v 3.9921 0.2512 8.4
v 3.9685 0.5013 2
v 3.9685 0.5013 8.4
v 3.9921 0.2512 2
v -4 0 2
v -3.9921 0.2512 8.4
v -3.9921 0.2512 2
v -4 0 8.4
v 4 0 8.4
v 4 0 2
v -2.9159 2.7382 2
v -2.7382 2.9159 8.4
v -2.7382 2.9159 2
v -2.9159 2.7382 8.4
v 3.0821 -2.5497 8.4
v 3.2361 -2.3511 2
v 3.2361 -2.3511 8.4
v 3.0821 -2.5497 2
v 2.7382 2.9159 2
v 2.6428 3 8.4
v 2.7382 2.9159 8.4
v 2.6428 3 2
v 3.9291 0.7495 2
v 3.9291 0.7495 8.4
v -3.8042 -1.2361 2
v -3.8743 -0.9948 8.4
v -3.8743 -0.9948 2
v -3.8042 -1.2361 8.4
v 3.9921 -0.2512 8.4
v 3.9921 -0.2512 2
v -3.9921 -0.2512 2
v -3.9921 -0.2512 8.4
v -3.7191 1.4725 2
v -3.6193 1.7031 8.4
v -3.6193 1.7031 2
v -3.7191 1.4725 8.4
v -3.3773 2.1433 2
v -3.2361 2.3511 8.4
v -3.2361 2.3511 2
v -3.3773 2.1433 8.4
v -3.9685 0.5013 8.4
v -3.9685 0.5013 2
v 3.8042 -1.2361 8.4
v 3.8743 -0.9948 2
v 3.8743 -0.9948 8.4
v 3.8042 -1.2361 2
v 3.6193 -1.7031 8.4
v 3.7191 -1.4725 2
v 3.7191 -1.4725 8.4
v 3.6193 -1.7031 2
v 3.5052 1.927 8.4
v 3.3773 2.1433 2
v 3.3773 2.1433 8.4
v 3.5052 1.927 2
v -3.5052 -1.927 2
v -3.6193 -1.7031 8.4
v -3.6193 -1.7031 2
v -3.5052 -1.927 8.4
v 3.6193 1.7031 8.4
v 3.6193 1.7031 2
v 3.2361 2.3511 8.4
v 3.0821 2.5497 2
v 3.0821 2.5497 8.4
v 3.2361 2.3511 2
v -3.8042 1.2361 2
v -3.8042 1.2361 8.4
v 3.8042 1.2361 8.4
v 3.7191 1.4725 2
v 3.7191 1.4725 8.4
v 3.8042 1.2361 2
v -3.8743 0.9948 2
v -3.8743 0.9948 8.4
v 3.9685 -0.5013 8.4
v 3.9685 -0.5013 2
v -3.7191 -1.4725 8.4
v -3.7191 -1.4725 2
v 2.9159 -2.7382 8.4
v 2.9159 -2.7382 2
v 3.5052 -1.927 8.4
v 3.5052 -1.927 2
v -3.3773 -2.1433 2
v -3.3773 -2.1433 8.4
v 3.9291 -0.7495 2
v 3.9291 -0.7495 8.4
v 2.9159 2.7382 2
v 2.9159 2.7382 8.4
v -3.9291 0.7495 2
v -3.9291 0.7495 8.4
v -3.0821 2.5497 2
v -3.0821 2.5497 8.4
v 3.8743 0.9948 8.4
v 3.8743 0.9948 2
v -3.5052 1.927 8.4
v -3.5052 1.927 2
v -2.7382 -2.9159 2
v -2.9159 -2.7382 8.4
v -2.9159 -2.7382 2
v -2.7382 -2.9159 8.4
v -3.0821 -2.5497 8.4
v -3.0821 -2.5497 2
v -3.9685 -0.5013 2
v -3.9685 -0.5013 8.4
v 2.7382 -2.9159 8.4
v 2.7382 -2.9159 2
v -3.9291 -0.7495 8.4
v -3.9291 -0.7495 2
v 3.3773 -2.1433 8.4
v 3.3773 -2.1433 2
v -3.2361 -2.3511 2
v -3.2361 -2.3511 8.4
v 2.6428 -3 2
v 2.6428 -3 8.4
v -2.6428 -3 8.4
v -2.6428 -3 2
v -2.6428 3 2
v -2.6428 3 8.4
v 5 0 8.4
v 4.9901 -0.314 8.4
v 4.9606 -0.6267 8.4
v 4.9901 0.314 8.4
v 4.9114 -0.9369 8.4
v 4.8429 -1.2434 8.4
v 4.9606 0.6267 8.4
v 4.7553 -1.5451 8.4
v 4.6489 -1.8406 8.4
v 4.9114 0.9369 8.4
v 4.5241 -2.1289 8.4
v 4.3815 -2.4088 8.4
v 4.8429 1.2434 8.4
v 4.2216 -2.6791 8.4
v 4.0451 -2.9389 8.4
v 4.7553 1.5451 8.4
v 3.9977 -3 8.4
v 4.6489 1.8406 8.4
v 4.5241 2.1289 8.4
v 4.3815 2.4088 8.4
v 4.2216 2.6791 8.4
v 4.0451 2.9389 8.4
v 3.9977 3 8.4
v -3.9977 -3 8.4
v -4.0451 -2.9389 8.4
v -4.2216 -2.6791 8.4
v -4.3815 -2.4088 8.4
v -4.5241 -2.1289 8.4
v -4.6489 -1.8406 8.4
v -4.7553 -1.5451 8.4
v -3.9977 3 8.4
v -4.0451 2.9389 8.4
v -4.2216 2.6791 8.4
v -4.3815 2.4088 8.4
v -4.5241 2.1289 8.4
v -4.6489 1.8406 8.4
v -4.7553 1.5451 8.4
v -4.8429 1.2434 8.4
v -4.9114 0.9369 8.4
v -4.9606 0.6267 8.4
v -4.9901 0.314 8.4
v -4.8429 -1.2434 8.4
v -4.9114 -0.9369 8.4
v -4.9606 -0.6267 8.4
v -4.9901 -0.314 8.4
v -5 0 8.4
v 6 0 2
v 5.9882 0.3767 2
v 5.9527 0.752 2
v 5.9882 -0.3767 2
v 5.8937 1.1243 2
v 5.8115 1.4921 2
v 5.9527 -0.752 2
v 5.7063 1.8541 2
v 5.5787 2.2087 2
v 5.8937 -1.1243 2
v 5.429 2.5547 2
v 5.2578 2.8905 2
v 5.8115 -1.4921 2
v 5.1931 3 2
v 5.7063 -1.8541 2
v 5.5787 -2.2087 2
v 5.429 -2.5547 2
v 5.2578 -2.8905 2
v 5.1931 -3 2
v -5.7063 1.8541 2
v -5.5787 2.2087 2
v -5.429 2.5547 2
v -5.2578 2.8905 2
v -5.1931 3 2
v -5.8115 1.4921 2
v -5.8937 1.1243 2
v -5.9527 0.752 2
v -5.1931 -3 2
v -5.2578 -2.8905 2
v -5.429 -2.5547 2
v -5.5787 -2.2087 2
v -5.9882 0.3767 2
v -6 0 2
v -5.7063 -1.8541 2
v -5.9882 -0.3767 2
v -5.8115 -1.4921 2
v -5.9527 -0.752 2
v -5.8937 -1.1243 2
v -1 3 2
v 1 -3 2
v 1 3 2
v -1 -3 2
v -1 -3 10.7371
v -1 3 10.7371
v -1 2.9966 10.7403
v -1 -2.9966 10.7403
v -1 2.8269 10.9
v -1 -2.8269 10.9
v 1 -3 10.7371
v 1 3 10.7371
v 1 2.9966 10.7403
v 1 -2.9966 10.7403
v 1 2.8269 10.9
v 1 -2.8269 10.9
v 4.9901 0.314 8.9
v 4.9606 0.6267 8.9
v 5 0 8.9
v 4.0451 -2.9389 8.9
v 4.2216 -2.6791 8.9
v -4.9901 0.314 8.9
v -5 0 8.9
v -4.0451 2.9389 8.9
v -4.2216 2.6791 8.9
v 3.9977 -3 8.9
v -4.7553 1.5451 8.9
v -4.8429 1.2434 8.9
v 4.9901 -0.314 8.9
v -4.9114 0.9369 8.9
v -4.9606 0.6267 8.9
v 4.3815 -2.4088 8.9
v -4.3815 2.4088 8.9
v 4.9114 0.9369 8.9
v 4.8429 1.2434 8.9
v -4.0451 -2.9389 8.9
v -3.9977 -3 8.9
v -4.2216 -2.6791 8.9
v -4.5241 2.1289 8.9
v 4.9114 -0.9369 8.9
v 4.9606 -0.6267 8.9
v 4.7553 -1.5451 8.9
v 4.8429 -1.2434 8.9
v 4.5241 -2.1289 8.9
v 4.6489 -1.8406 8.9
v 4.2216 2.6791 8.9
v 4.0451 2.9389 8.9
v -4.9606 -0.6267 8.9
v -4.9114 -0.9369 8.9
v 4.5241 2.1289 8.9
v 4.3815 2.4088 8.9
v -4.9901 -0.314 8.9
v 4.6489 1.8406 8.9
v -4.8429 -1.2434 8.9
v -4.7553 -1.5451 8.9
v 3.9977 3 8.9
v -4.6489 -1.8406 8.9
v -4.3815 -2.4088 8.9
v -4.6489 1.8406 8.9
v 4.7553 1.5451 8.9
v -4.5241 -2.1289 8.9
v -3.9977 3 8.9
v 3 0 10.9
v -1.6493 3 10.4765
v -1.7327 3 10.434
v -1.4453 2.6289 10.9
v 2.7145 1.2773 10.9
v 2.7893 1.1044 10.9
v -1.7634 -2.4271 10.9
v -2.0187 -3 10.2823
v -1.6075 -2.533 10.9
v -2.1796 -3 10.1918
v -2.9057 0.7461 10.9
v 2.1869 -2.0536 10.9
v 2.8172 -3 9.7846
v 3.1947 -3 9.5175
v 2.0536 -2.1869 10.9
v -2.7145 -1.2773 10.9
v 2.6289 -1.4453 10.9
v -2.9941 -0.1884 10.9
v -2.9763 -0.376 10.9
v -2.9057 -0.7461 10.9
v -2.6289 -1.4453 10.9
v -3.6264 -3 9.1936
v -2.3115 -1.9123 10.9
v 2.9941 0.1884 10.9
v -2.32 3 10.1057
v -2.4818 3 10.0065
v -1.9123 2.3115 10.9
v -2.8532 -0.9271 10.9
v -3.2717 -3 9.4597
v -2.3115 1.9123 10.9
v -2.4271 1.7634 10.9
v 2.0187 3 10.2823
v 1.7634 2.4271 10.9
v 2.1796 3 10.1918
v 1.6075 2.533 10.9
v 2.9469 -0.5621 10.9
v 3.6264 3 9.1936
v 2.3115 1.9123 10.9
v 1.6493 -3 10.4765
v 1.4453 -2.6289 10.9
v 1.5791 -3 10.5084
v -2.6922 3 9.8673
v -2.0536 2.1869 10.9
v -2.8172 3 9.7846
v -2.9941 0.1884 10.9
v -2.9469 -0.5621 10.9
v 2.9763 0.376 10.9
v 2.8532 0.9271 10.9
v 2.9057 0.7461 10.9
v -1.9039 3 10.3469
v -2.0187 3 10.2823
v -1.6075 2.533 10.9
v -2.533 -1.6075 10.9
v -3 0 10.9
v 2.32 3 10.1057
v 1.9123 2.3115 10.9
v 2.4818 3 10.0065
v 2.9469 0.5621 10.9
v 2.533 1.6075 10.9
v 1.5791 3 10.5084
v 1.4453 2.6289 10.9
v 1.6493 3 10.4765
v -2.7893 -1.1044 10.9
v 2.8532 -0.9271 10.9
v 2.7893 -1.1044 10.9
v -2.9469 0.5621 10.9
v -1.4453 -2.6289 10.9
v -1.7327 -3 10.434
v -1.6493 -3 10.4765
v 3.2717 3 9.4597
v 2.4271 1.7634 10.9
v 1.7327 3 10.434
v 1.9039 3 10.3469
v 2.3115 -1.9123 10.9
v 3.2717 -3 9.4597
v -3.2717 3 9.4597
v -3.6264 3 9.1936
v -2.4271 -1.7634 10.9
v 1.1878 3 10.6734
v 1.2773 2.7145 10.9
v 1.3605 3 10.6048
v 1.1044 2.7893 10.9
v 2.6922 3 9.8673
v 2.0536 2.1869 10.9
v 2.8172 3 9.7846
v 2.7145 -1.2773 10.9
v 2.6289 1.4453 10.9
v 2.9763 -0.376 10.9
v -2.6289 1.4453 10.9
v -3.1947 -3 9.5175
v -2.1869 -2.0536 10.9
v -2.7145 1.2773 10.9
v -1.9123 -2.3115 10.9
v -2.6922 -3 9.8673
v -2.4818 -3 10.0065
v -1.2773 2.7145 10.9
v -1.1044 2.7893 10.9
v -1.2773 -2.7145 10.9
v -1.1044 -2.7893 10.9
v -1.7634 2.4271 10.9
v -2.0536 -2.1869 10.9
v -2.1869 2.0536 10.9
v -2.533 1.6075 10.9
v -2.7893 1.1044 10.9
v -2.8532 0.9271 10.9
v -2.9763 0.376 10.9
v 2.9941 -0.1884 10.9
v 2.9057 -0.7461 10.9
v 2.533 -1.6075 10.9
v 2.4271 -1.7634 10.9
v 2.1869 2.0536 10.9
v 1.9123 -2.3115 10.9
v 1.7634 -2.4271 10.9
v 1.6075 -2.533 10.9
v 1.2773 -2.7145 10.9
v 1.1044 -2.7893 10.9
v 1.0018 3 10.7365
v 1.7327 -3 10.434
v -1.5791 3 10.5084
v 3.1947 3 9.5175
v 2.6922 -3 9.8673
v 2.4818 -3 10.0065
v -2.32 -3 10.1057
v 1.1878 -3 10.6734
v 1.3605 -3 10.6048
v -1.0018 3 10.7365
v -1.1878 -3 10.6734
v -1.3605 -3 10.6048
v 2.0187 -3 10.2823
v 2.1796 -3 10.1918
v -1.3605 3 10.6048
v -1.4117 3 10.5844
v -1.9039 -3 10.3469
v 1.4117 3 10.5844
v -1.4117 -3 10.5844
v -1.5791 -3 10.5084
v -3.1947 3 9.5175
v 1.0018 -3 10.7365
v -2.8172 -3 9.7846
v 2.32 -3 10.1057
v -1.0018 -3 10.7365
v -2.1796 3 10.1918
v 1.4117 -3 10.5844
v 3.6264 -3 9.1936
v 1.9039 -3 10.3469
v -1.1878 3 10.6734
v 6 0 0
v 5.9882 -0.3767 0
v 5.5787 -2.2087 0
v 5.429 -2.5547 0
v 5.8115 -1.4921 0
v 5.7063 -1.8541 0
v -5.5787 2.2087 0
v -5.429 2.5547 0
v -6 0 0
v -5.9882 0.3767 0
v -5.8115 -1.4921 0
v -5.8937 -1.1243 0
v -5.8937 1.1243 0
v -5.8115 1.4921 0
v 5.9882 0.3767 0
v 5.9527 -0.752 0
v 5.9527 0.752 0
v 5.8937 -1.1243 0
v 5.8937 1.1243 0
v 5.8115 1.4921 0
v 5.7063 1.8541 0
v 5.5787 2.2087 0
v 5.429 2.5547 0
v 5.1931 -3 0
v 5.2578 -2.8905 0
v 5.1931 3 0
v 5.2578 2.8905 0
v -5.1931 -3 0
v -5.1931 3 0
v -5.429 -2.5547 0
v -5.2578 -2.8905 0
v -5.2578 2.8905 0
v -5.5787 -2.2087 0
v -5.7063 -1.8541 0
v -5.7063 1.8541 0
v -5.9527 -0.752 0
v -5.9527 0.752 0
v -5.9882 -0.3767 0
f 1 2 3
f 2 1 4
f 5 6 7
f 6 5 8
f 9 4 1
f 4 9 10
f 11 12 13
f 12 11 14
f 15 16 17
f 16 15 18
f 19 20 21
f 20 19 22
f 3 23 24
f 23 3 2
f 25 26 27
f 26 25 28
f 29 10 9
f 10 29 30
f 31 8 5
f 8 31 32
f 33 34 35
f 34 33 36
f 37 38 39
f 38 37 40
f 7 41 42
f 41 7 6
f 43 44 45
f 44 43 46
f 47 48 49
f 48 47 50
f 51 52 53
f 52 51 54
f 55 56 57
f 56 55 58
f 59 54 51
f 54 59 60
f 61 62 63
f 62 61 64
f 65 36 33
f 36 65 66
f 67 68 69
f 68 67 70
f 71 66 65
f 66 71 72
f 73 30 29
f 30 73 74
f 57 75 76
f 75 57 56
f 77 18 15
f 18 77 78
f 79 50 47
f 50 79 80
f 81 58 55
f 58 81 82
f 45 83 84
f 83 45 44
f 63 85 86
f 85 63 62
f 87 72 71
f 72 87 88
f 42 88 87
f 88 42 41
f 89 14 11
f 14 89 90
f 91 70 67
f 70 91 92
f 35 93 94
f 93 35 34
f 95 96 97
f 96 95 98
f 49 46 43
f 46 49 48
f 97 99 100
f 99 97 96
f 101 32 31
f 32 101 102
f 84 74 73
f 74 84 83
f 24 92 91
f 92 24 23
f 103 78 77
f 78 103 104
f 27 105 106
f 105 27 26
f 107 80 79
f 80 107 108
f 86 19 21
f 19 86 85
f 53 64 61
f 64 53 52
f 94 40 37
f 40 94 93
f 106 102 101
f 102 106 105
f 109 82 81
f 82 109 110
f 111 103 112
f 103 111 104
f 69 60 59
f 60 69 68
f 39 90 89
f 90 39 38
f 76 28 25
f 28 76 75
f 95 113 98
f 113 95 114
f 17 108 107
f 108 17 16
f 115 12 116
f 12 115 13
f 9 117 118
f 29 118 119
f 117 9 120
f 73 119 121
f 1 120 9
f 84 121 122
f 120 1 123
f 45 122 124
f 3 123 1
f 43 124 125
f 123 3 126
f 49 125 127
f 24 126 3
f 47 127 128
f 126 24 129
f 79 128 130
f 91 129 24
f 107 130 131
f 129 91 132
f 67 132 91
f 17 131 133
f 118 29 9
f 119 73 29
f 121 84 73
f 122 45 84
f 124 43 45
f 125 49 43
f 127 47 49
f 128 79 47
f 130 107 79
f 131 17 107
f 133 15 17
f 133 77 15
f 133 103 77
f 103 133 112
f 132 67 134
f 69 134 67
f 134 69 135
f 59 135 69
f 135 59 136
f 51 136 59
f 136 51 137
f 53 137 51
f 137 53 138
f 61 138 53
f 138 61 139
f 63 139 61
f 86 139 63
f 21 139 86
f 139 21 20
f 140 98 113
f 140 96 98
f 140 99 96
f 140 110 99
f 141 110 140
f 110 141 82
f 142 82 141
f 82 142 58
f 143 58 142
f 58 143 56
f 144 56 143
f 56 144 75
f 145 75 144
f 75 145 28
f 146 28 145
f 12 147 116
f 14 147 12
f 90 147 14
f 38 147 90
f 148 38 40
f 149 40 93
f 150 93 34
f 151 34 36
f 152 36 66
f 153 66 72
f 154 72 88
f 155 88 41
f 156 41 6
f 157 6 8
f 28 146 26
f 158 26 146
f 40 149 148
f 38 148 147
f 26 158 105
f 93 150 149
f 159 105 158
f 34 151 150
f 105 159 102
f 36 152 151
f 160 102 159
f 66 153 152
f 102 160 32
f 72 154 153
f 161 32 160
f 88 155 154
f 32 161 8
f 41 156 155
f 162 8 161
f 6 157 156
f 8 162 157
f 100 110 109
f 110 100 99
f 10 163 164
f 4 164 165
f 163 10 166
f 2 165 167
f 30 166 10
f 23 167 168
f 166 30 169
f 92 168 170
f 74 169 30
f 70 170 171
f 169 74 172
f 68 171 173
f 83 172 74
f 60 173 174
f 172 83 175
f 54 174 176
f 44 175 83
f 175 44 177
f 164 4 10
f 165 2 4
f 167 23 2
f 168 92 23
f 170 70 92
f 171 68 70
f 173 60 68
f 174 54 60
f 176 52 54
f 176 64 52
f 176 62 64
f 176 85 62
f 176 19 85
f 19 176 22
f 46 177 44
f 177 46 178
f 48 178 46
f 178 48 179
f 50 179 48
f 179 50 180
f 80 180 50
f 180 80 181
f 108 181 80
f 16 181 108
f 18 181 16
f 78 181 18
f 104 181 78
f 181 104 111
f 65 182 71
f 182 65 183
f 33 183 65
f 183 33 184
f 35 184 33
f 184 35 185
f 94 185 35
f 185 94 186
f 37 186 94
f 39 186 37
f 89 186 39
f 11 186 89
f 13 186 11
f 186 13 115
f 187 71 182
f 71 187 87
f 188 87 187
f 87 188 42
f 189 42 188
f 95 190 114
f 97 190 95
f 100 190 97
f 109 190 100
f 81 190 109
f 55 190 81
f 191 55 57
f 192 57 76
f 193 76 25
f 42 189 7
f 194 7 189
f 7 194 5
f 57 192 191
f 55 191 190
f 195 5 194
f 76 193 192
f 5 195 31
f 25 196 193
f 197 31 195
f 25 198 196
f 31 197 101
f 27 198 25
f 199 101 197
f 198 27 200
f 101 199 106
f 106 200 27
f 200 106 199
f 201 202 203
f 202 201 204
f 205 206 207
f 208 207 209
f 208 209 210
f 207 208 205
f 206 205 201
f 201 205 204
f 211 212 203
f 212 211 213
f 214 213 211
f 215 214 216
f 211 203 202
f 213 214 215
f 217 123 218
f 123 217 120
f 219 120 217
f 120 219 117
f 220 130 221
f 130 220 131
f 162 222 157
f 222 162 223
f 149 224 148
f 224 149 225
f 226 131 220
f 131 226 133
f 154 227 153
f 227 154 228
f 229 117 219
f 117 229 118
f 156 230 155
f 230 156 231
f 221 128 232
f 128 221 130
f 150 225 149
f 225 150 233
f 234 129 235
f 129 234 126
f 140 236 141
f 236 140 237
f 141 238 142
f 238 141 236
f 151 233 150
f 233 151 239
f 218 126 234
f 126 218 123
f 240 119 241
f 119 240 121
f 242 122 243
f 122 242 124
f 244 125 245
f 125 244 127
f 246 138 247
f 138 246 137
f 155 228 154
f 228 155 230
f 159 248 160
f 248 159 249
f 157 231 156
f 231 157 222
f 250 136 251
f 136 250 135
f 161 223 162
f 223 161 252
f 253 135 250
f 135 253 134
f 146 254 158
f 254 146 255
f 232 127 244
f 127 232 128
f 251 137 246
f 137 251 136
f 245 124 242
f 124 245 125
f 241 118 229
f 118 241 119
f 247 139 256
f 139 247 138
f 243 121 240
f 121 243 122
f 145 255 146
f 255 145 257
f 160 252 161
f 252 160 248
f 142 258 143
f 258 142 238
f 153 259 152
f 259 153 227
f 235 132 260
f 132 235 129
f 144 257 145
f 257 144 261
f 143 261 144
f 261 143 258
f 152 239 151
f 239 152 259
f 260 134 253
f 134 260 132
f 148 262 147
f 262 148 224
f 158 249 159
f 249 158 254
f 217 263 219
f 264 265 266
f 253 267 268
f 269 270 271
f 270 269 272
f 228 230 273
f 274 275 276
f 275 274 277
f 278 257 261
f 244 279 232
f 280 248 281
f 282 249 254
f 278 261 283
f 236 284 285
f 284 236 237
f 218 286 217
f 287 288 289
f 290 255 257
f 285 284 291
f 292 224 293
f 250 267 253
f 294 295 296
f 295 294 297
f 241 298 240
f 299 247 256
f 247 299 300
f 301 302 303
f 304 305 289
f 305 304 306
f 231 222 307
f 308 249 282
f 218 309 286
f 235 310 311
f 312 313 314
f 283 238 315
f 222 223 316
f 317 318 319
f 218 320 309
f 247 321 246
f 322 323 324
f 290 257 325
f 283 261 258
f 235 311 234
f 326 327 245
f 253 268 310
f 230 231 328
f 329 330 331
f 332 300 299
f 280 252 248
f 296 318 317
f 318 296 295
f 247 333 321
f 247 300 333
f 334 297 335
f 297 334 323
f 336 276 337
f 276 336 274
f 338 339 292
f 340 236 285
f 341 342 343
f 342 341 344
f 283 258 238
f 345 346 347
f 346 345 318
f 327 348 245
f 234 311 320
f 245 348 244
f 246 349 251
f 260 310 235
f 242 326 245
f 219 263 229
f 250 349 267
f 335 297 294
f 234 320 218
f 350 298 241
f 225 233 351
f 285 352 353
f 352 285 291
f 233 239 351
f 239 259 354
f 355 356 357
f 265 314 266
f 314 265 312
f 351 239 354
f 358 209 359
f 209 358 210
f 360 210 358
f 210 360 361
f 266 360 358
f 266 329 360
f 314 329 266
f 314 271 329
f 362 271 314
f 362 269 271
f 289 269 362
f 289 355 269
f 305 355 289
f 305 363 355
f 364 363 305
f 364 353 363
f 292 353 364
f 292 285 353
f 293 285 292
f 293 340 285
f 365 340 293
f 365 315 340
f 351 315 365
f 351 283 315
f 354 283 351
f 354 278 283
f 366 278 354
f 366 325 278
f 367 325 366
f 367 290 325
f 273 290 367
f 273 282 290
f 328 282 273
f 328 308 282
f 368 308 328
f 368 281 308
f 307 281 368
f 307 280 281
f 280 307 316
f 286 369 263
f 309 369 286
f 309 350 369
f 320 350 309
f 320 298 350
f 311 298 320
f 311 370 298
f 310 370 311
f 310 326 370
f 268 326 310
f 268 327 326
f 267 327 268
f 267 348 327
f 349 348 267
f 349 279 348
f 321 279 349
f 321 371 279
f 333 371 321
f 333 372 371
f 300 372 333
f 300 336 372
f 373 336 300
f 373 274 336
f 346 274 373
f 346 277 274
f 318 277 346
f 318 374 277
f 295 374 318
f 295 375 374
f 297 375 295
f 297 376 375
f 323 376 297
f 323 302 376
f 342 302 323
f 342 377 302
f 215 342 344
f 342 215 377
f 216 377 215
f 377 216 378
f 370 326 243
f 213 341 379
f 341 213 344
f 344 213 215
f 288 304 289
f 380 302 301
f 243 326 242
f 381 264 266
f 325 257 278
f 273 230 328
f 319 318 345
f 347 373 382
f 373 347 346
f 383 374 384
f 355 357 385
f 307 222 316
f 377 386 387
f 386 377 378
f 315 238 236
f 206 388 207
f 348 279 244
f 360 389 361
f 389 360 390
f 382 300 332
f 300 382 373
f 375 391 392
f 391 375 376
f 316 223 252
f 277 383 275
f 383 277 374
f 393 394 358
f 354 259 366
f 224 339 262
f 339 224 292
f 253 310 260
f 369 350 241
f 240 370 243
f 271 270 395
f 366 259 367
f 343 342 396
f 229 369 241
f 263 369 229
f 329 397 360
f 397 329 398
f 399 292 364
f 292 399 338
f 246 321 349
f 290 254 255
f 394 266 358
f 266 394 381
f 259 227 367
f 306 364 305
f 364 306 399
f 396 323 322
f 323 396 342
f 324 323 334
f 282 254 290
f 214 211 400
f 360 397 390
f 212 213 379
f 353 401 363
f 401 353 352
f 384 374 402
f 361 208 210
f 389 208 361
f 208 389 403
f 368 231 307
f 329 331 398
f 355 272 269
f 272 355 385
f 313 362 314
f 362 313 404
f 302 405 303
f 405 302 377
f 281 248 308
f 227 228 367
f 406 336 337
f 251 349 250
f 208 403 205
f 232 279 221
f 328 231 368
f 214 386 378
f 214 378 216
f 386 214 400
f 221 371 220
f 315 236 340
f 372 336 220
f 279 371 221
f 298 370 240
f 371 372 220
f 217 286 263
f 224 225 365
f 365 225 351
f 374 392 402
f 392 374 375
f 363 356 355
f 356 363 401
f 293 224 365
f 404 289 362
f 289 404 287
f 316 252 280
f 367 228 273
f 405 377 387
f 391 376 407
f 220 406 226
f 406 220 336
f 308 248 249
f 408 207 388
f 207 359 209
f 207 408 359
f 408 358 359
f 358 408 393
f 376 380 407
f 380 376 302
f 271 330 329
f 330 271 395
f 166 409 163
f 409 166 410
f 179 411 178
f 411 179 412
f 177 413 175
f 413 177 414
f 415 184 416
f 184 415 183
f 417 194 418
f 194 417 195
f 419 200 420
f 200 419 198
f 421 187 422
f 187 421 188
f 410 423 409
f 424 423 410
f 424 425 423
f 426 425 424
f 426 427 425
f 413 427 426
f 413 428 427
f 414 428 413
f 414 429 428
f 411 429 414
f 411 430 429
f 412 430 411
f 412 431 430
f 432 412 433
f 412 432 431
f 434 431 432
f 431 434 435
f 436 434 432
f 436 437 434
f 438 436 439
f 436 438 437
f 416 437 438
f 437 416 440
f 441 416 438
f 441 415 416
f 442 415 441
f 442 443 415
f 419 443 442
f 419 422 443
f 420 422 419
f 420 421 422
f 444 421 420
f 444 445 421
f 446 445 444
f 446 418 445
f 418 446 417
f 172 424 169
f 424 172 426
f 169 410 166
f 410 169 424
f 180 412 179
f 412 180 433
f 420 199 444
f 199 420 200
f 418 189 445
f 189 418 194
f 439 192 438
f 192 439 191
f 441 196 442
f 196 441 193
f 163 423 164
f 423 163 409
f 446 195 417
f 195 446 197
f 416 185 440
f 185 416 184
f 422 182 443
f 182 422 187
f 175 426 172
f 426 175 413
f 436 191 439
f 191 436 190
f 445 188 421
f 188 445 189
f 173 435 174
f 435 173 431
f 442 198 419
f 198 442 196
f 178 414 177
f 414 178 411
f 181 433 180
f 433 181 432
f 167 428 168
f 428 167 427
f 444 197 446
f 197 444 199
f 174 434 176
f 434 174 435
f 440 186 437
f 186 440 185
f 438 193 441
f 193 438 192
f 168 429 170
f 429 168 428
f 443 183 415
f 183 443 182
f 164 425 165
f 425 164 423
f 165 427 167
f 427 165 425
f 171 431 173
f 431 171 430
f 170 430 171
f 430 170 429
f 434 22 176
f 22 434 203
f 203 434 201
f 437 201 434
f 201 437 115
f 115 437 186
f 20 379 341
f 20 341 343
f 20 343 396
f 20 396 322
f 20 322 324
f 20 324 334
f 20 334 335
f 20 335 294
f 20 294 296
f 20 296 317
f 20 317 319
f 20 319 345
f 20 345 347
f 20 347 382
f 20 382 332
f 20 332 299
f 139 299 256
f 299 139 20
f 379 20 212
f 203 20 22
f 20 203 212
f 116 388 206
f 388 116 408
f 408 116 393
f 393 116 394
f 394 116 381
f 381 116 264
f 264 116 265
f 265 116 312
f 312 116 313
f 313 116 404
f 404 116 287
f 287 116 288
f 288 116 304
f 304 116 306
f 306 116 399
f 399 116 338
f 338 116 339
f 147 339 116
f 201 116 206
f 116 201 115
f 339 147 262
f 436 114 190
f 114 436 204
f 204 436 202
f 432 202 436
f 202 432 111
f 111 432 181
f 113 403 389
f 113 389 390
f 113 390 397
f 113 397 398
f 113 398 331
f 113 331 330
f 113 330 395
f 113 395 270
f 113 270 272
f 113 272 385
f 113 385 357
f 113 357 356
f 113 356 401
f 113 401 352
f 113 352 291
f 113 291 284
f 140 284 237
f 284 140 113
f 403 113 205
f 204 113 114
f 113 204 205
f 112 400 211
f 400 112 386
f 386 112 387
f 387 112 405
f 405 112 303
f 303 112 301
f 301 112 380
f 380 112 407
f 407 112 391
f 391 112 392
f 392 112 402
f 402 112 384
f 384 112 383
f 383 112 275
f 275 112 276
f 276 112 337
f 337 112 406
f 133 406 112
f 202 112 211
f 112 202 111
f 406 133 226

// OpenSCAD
//Diameter of pin bottom
baseDiam = 12; 
//Diameter of pin inner cylinder 
innerDiam = 8; 

//Thickness of pin bottom
baseHeight = 2; 
//Length of inner cylinder
innerHeight = 6.4; 

//Diameter of hook
hookDiam = innerDiam + 2; 

//Height of hook 
hookHeight = 2; 

//Width of inner slot
innerWidth = 2; 

//Angle of chamfer
chamferAngle = 45; 

//Overall width of pin
pinWidth = 3; 

//Make double sided?
doubleSided = "no"; //[no,yes] 

module pinSection(diam, height, trans){
    translate([0,0,trans])
        linear_extrude(height = height, center = false, convexity = 10, twist = 0)
        circle(d=diam);
}

module hookSection(diam, height, trans, angle){
    topDiam = diam/2 - (height/tan(angle));
    pinSection(diam, 0.5, trans);
    translate([0,0,trans+0.5])
    cylinder(height, diam/2, topDiam, center = false);
}

module slotCut(trans, height, width){
    translate([0,0,trans])
    linear_extrude(height = height+1, center = false, convexity = 10, twist = 0)
    square([width,baseDiam], center = true);
}

module sideCut(thickness, height, width){
    translate([0,thickness,0])
    linear_extrude(height = height, center = false, convexity = 10, twist = 0)
    square([width,width], center = false);
}

module pin($fn = 100){
    pinSection(baseDiam, baseHeight);

    difference(){
        pinSection(innerDiam, innerHeight, baseHeight);
        slotCut(baseHeight, innerHeight, innerWidth);
    }

    difference(){
        hookSection(hookDiam, hookHeight, innerHeight+baseHeight, chamferAngle);        
        slotCut(innerHeight+baseHeight, hookHeight, innerWidth);
    }
    
    
}

module generatePin(){
    difference(){
        pin();
        sideCut(pinWidth,innerHeight + baseHeight+hookHeight+1,baseDiam);
        mirror([1,0,0]) sideCut(pinWidth,innerHeight + baseHeight+hookHeight+1,baseDiam);
        mirror([0,1,0]) sideCut(pinWidth,innerHeight + baseHeight+hookHeight+1,baseDiam);
        mirror([0,1,0]) mirror([1,0,0]) sideCut(pinWidth,innerHeight + baseHeight+hookHeight+1,baseDiam);
    }
}


if(doubleSided == "yes"){
    generatePin();
    mirror([0,0,-1]) generatePin();
}
else{
    generatePin();
}
